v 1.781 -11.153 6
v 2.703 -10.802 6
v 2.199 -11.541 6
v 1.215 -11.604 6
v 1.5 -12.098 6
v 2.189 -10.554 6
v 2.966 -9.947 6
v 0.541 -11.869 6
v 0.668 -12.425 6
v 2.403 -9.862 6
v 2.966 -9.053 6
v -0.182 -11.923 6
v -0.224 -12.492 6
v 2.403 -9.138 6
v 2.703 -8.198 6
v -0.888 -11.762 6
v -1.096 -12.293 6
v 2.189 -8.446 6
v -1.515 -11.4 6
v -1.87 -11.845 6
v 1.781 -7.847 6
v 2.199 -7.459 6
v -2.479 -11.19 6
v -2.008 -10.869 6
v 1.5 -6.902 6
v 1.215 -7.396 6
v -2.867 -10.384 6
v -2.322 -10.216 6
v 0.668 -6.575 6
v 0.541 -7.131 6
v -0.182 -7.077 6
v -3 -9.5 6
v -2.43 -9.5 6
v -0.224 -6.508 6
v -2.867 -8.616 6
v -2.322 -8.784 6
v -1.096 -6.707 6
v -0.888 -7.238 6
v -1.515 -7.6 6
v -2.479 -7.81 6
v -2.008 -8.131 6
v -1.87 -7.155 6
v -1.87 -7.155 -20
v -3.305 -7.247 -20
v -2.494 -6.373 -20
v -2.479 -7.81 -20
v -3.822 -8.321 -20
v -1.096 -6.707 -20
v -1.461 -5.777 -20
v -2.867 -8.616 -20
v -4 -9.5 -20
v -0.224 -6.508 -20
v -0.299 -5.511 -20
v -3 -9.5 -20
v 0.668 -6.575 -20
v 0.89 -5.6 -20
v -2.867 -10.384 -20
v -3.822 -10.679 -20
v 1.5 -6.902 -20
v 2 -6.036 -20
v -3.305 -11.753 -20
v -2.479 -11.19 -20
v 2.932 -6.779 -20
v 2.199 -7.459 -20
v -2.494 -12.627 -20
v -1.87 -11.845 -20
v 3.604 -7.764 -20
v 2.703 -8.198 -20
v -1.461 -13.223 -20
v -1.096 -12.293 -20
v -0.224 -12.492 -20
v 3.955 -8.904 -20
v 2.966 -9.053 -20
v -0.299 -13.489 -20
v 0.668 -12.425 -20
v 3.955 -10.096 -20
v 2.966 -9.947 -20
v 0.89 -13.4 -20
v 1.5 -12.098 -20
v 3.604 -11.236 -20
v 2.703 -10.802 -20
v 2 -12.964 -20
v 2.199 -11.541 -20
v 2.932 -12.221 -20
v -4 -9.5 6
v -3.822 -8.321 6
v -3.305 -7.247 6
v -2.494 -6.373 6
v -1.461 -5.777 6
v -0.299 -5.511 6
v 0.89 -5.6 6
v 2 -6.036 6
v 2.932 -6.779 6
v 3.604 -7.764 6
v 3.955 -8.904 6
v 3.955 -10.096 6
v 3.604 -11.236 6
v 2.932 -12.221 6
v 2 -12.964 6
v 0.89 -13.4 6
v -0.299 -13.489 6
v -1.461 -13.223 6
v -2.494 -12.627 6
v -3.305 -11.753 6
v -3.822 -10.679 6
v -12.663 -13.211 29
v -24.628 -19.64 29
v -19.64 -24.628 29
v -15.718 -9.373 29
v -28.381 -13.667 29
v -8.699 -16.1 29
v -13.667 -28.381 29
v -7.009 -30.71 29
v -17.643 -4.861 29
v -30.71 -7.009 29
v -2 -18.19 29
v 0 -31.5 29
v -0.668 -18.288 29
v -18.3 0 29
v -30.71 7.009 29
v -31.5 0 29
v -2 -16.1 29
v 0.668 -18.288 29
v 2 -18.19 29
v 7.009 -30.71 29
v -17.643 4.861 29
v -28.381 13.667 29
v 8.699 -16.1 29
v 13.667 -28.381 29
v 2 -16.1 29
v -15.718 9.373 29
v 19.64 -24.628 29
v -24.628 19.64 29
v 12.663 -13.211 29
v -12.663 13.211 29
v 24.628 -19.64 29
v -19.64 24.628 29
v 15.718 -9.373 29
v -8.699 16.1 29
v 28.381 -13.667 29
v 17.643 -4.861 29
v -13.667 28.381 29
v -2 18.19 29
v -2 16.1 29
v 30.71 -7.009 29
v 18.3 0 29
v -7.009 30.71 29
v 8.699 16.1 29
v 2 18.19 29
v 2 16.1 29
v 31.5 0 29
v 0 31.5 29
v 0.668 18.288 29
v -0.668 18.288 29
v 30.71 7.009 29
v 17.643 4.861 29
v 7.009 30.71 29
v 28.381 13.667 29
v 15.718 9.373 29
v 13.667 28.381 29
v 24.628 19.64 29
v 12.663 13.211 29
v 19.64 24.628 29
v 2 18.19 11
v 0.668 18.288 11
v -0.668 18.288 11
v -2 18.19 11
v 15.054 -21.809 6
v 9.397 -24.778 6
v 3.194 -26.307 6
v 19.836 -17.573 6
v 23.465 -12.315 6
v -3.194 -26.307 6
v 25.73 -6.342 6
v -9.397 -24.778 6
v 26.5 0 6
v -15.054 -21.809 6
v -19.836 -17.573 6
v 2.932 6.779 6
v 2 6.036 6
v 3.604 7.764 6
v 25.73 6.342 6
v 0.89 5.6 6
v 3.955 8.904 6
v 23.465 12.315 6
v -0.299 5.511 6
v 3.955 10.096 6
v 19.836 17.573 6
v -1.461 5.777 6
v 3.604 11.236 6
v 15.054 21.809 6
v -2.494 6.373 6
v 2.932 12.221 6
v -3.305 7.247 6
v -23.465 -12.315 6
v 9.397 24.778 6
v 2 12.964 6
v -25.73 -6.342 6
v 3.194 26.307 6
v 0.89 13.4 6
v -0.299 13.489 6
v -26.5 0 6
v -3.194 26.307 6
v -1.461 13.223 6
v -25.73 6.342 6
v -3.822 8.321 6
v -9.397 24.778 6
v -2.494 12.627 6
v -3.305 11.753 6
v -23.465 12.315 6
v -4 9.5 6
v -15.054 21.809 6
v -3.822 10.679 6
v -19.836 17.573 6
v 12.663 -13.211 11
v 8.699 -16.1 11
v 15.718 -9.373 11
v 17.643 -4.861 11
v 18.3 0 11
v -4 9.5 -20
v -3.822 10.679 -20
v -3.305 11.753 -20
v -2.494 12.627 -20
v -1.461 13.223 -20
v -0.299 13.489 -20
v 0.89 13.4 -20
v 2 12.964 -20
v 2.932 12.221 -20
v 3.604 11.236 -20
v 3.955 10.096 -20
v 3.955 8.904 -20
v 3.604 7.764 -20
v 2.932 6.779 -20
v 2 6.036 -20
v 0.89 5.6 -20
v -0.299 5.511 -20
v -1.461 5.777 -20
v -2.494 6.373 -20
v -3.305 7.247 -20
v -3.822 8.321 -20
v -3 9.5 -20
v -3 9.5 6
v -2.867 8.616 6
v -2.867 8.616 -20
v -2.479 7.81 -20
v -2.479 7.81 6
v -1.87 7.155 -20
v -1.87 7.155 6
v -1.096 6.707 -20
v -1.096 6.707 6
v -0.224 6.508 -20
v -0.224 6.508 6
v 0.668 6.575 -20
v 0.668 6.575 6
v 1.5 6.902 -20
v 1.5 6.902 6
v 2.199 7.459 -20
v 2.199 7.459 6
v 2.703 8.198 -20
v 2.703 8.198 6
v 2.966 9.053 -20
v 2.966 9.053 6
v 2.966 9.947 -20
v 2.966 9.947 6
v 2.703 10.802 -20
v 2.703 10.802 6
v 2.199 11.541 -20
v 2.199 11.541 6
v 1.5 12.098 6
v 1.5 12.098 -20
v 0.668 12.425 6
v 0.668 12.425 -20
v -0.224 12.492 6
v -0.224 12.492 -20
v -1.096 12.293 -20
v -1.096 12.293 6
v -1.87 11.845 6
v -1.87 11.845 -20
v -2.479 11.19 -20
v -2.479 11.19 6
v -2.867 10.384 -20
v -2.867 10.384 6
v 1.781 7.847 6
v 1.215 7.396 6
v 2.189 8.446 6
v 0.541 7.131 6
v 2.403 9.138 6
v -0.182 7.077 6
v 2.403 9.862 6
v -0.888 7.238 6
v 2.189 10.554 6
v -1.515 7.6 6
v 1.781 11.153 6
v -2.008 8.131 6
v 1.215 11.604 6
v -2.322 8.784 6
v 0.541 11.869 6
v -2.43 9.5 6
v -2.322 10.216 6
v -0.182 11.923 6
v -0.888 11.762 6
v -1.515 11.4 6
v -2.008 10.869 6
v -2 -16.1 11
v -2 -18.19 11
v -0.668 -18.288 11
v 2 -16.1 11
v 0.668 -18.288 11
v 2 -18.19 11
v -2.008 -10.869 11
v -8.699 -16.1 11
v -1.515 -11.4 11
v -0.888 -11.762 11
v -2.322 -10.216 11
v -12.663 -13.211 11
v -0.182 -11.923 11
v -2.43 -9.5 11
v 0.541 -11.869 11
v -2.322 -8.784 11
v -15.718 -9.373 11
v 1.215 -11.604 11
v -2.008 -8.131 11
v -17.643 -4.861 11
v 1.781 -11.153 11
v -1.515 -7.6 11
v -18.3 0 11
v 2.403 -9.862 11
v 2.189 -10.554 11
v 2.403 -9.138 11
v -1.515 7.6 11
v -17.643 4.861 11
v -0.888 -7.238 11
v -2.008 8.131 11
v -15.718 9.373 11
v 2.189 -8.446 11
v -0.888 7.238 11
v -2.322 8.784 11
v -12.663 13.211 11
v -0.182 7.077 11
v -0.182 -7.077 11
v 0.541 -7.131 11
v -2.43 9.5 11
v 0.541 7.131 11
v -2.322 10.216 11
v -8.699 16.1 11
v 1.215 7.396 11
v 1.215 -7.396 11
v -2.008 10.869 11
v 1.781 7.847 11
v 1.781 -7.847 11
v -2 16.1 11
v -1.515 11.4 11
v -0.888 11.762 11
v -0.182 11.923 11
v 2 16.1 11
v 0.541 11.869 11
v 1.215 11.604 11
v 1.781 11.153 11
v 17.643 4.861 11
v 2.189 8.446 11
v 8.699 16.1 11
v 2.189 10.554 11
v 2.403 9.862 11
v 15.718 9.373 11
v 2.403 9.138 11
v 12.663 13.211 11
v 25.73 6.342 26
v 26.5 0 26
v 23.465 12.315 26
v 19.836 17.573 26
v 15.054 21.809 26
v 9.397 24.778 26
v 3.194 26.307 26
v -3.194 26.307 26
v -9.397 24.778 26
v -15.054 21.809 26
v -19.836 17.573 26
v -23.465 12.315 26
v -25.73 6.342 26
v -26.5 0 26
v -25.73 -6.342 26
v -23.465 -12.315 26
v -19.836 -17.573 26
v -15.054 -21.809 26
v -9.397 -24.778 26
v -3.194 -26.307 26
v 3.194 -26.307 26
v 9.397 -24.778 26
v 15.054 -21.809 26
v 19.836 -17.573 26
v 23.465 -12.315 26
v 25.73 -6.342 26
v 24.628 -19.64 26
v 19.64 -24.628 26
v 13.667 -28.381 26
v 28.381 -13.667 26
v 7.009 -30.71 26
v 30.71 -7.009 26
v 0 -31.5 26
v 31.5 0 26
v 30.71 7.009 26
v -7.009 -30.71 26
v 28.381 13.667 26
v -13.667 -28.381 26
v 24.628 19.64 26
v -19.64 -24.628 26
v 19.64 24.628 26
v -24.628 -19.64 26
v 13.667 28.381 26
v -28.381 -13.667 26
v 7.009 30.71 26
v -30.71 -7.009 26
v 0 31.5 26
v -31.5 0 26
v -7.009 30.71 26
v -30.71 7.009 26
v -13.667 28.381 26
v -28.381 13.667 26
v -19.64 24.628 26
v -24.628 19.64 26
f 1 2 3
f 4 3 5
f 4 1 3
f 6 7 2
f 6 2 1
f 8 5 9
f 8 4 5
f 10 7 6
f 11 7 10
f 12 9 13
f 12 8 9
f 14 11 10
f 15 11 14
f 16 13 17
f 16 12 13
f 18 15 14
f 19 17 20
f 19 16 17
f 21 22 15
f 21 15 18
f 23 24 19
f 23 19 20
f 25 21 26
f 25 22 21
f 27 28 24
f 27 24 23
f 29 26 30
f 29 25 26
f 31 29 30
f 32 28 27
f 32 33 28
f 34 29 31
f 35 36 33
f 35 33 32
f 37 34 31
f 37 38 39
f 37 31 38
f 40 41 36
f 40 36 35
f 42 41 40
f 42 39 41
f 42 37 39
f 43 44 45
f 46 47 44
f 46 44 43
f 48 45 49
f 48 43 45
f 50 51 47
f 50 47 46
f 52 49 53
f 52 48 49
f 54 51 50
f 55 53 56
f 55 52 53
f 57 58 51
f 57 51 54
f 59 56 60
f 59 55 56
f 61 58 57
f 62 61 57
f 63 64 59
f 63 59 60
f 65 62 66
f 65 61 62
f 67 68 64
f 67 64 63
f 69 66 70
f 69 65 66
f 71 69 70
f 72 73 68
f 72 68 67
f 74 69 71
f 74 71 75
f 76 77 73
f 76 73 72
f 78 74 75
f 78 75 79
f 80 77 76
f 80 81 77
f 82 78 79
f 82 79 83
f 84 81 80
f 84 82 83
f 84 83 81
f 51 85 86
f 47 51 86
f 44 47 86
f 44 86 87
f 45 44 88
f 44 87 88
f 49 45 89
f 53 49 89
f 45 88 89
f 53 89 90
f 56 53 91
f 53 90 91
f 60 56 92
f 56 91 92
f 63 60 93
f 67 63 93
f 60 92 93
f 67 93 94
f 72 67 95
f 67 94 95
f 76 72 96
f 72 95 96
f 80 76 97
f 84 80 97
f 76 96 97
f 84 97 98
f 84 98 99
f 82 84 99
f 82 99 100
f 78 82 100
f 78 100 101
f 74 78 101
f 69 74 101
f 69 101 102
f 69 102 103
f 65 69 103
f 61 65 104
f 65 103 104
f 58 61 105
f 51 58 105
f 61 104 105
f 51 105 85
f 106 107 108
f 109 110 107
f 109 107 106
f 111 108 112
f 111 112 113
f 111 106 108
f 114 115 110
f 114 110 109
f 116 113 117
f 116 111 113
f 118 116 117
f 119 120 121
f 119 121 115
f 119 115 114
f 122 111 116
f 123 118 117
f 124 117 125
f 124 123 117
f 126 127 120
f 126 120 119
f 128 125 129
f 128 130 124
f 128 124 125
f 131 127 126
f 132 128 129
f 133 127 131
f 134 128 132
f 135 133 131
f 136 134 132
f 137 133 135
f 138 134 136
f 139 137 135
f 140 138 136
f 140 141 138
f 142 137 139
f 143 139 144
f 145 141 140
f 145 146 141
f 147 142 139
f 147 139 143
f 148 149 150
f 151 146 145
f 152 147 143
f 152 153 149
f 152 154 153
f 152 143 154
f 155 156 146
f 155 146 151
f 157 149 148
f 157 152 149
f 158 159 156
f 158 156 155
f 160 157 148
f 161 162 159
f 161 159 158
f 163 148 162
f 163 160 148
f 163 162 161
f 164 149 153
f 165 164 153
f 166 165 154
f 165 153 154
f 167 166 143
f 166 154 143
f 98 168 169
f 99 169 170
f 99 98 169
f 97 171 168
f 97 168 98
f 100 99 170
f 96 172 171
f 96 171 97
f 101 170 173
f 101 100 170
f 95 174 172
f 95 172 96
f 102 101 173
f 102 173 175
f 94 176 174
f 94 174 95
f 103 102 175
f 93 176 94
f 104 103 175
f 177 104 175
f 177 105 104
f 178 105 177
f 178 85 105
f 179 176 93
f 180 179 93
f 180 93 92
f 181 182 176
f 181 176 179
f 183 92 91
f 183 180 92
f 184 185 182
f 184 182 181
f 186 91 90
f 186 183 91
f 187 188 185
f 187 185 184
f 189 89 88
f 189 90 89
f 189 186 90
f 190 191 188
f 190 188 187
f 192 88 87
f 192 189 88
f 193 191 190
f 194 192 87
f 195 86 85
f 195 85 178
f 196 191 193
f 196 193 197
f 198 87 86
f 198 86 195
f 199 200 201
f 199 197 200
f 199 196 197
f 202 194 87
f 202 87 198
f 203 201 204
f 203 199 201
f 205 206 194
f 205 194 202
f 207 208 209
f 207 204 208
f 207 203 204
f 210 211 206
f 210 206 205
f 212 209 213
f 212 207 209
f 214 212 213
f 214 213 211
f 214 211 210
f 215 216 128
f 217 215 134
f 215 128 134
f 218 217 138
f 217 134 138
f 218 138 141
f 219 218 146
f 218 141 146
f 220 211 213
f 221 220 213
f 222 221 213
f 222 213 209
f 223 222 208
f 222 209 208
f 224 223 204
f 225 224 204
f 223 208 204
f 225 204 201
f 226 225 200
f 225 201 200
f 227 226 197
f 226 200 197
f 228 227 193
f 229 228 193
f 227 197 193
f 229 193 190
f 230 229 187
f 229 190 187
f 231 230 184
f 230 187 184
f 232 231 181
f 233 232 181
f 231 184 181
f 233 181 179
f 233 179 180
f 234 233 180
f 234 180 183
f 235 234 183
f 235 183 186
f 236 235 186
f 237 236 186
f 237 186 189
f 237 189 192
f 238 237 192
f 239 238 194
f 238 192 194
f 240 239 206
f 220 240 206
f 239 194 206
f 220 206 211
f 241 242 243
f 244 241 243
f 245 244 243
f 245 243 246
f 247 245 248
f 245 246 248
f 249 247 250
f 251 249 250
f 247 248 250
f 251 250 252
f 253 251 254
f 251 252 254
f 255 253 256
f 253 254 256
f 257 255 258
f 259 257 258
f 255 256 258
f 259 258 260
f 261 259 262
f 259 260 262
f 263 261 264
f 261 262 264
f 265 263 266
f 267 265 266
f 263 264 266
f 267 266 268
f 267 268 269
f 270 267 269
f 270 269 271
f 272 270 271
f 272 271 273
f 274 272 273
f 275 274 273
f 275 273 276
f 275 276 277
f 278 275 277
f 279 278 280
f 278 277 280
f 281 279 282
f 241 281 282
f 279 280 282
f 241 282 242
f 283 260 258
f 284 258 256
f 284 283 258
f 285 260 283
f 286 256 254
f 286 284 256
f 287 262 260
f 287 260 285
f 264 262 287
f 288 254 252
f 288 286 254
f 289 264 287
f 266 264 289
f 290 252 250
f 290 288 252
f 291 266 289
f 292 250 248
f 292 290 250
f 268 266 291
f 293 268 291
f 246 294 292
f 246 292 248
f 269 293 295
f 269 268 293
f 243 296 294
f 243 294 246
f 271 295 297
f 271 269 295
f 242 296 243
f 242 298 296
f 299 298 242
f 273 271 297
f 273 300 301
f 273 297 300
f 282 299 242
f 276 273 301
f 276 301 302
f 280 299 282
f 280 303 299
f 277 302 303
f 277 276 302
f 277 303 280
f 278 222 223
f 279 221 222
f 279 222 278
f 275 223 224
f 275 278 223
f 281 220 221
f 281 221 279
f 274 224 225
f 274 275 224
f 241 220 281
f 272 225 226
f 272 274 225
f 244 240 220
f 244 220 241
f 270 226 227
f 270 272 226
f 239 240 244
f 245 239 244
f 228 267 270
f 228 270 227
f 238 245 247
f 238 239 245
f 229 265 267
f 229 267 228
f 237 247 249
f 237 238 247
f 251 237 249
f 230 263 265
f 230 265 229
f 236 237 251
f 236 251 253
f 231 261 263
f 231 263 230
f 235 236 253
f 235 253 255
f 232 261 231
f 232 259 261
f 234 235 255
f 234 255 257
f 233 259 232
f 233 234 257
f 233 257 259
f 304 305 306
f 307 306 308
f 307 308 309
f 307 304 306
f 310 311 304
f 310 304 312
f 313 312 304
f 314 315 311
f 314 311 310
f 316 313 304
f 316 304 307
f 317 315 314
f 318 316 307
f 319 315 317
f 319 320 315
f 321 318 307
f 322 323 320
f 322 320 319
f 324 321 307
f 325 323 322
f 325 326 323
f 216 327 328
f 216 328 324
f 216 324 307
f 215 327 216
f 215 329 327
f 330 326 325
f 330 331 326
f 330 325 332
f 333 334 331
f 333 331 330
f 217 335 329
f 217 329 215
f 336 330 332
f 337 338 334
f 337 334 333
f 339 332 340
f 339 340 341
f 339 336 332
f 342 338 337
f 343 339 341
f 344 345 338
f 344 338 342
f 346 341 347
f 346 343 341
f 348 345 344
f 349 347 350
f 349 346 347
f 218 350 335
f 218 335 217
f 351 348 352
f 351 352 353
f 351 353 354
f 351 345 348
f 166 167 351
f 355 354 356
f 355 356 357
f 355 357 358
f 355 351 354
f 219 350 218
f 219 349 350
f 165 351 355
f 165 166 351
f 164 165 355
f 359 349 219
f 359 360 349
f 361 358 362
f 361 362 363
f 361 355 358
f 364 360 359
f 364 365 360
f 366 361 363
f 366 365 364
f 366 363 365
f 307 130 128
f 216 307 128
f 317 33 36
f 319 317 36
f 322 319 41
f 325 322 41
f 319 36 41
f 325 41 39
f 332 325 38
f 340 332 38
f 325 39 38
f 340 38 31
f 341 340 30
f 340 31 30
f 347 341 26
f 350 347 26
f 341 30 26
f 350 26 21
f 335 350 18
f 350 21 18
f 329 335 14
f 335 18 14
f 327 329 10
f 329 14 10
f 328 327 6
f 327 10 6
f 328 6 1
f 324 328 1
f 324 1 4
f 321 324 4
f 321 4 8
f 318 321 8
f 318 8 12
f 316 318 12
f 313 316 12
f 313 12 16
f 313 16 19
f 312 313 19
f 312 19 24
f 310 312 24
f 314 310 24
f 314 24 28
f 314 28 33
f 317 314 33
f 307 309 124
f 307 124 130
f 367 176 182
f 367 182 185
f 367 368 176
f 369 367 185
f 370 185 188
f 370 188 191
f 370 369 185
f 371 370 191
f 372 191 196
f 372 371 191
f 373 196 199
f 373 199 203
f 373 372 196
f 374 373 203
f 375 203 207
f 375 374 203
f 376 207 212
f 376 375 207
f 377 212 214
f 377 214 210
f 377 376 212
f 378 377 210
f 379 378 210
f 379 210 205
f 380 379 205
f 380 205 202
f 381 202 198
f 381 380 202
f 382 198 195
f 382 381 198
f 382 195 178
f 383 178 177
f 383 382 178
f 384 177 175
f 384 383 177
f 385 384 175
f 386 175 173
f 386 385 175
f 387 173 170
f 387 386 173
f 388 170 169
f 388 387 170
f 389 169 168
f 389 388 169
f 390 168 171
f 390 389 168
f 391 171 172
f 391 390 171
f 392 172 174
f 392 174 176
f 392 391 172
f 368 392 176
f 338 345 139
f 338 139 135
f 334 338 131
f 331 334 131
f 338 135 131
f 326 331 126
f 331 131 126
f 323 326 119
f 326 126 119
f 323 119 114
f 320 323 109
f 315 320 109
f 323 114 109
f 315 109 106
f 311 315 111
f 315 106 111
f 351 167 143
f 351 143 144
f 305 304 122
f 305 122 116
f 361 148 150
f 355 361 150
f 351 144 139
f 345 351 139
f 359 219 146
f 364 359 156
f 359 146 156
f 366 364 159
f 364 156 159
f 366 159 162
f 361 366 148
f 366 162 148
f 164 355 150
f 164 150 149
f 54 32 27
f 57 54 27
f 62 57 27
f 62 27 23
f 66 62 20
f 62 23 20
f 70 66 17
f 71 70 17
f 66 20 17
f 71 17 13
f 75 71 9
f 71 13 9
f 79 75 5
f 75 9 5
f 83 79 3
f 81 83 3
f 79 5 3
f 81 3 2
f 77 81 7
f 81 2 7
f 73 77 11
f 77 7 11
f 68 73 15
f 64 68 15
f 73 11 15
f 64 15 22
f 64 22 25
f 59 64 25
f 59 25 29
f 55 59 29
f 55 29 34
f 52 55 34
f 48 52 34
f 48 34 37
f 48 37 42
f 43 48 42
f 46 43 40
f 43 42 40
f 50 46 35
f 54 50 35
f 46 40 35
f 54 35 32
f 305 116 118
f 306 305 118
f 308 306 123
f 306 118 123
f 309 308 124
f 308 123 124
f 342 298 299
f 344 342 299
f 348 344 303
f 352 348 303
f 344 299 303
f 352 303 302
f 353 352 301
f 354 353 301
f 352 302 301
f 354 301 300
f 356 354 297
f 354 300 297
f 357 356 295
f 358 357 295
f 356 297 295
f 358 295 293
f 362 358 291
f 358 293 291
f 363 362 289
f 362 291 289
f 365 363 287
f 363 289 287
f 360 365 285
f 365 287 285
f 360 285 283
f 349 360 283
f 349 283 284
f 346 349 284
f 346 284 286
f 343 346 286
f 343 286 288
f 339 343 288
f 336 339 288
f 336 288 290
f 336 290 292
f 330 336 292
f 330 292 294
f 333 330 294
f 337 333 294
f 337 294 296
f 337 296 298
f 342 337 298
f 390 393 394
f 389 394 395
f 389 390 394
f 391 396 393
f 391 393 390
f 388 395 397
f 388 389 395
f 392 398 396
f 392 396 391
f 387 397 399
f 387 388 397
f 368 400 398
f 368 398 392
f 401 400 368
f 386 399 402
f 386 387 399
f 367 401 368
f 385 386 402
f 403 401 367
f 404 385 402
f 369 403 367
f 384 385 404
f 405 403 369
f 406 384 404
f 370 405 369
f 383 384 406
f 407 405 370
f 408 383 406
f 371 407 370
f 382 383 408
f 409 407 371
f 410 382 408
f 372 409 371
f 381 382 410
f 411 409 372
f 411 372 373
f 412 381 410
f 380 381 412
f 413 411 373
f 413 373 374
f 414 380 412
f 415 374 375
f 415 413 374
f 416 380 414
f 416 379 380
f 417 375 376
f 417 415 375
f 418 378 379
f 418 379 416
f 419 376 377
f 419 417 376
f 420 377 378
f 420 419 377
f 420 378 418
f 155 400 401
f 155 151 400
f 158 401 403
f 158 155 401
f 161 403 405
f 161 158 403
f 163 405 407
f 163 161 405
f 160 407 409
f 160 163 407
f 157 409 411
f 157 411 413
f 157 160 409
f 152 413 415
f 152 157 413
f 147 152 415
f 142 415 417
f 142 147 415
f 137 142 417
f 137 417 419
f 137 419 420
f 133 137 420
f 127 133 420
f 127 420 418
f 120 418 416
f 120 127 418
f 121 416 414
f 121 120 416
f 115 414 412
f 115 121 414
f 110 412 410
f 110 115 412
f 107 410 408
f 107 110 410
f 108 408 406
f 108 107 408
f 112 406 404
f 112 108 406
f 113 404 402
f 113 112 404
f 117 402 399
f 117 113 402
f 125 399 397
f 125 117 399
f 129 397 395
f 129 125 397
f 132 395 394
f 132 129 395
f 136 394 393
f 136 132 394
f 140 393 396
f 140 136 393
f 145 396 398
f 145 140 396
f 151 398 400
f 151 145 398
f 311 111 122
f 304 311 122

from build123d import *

# Parameters (mm, degrees)
F3_DEPTH = 18
F4_D     = 4.86
F6_DEPTH = 26


with BuildPart() as f1:
    # F0 (on Front) → F1 (revolve)
    with BuildSketch(Plane.XZ):
        Polygon((0, 29), (0, 6), (26.5, 6), (26.5, 26), (31.5, 26), (31.5, 29), align=None)
    revolve(axis=Axis((0, 0, 14.5), (0, 0, 1)))

    # F2 (on face) → F3 (cut)
    with BuildSketch(Plane.XY.offset(29)):
        with BuildLine():
            Line((2, -16.1), (0, -16.1))
            Line((0, -16.1), (-2, -16.1))
            Line((-2, -16.1), (-2, -18.1903820741))
            ThreePointArc((-2, -18.1903820741), (0, -18.3), (2, -18.1903820741))
            Line((2, -18.1903820741), (2, -16.1))
        make_face()
        with BuildLine():
            Line((0, -9.5), (0, 0))
            Line((0, 0), (0, 9.5))
            Line((0, 9.5), (0, 16.1))
            Line((0, 16.1), (-2, 16.1))
            Line((-2, 16.1), (-8.6994252684, 16.1))
            ThreePointArc((-8.6994252684, 16.1), (-18.3, 0), (-8.6994252684, -16.1))
            Line((-8.6994252684, -16.1), (-2, -16.1))
            Line((-2, -16.1), (0, -16.1))
            Line((0, -16.1), (0, -9.5))
        make_face()
        with BuildLine():
            Line((-2, 16.1), (0, 16.1))
            Line((0, 16.1), (2, 16.1))
            Line((2, 16.1), (2, 18.1903820741))
            ThreePointArc((2, 18.1903820741), (0, 18.3), (-2, 18.1903820741))
            Line((-2, 18.1903820741), (-2, 16.1))
        make_face()
        with BuildLine():
            Line((0, 9.5), (0, 0))
            Line((0, 0), (10, 0))
            Line((10, 0), (18.3, 0))
            ThreePointArc((18.3, 0), (15.7176569884, 9.3725801567), (8.6994252684, 16.1))
            Line((8.6994252684, 16.1), (2, 16.1))
            Line((2, 16.1), (0, 16.1))
            Line((0, 16.1), (0, 9.5))
        make_face()
        with BuildLine():
            Line((10, 0), (0, 0))
            Line((0, 0), (0, -9.5))
            Line((0, -9.5), (0, -16.1))
            Line((0, -16.1), (2, -16.1))
            Line((2, -16.1), (8.6994252684, -16.1))
            ThreePointArc((8.6994252684, -16.1), (15.7176569884, -9.3725801567), (18.3, 0))
            Line((18.3, 0), (10, 0))
        make_face()
    extrude(amount=-F3_DEPTH, mode=Mode.SUBTRACT)

    # F4 (through all)
    with Locations(Plane.XY.offset(29)):
        with Locations((0, 9.5), (0, -9.5)):
            Hole(F4_D / 2)

    # F5 (on face) → F6 (join)
    with BuildSketch(Plane(origin=(0, 0, 6), x_dir=(1, 0, 0), z_dir=(0, 0, -1))):
        with BuildLine():
            ThreePointArc((4, 9.5), (0, 13.5), (-4, 9.5))
            ThreePointArc((-4, 9.5), (0, 5.5), (4, 9.5))
        make_face()
        with BuildLine():
            ThreePointArc((3, 9.5), (0, 6.5), (-3, 9.5))
            ThreePointArc((-3, 9.5), (0, 12.5), (3, 9.5))
        make_face(mode=Mode.SUBTRACT)
        with BuildLine():
            ThreePointArc((4, -9.5), (0, -5.5), (-4, -9.5))
            ThreePointArc((-4, -9.5), (0, -13.5), (4, -9.5))
        make_face()
        with BuildLine():
            ThreePointArc((3, -9.5), (0, -12.5), (-3, -9.5))
            ThreePointArc((-3, -9.5), (0, -6.5), (3, -9.5))
        make_face(mode=Mode.SUBTRACT)
    extrude(amount=F6_DEPTH)


solid = f1.part
